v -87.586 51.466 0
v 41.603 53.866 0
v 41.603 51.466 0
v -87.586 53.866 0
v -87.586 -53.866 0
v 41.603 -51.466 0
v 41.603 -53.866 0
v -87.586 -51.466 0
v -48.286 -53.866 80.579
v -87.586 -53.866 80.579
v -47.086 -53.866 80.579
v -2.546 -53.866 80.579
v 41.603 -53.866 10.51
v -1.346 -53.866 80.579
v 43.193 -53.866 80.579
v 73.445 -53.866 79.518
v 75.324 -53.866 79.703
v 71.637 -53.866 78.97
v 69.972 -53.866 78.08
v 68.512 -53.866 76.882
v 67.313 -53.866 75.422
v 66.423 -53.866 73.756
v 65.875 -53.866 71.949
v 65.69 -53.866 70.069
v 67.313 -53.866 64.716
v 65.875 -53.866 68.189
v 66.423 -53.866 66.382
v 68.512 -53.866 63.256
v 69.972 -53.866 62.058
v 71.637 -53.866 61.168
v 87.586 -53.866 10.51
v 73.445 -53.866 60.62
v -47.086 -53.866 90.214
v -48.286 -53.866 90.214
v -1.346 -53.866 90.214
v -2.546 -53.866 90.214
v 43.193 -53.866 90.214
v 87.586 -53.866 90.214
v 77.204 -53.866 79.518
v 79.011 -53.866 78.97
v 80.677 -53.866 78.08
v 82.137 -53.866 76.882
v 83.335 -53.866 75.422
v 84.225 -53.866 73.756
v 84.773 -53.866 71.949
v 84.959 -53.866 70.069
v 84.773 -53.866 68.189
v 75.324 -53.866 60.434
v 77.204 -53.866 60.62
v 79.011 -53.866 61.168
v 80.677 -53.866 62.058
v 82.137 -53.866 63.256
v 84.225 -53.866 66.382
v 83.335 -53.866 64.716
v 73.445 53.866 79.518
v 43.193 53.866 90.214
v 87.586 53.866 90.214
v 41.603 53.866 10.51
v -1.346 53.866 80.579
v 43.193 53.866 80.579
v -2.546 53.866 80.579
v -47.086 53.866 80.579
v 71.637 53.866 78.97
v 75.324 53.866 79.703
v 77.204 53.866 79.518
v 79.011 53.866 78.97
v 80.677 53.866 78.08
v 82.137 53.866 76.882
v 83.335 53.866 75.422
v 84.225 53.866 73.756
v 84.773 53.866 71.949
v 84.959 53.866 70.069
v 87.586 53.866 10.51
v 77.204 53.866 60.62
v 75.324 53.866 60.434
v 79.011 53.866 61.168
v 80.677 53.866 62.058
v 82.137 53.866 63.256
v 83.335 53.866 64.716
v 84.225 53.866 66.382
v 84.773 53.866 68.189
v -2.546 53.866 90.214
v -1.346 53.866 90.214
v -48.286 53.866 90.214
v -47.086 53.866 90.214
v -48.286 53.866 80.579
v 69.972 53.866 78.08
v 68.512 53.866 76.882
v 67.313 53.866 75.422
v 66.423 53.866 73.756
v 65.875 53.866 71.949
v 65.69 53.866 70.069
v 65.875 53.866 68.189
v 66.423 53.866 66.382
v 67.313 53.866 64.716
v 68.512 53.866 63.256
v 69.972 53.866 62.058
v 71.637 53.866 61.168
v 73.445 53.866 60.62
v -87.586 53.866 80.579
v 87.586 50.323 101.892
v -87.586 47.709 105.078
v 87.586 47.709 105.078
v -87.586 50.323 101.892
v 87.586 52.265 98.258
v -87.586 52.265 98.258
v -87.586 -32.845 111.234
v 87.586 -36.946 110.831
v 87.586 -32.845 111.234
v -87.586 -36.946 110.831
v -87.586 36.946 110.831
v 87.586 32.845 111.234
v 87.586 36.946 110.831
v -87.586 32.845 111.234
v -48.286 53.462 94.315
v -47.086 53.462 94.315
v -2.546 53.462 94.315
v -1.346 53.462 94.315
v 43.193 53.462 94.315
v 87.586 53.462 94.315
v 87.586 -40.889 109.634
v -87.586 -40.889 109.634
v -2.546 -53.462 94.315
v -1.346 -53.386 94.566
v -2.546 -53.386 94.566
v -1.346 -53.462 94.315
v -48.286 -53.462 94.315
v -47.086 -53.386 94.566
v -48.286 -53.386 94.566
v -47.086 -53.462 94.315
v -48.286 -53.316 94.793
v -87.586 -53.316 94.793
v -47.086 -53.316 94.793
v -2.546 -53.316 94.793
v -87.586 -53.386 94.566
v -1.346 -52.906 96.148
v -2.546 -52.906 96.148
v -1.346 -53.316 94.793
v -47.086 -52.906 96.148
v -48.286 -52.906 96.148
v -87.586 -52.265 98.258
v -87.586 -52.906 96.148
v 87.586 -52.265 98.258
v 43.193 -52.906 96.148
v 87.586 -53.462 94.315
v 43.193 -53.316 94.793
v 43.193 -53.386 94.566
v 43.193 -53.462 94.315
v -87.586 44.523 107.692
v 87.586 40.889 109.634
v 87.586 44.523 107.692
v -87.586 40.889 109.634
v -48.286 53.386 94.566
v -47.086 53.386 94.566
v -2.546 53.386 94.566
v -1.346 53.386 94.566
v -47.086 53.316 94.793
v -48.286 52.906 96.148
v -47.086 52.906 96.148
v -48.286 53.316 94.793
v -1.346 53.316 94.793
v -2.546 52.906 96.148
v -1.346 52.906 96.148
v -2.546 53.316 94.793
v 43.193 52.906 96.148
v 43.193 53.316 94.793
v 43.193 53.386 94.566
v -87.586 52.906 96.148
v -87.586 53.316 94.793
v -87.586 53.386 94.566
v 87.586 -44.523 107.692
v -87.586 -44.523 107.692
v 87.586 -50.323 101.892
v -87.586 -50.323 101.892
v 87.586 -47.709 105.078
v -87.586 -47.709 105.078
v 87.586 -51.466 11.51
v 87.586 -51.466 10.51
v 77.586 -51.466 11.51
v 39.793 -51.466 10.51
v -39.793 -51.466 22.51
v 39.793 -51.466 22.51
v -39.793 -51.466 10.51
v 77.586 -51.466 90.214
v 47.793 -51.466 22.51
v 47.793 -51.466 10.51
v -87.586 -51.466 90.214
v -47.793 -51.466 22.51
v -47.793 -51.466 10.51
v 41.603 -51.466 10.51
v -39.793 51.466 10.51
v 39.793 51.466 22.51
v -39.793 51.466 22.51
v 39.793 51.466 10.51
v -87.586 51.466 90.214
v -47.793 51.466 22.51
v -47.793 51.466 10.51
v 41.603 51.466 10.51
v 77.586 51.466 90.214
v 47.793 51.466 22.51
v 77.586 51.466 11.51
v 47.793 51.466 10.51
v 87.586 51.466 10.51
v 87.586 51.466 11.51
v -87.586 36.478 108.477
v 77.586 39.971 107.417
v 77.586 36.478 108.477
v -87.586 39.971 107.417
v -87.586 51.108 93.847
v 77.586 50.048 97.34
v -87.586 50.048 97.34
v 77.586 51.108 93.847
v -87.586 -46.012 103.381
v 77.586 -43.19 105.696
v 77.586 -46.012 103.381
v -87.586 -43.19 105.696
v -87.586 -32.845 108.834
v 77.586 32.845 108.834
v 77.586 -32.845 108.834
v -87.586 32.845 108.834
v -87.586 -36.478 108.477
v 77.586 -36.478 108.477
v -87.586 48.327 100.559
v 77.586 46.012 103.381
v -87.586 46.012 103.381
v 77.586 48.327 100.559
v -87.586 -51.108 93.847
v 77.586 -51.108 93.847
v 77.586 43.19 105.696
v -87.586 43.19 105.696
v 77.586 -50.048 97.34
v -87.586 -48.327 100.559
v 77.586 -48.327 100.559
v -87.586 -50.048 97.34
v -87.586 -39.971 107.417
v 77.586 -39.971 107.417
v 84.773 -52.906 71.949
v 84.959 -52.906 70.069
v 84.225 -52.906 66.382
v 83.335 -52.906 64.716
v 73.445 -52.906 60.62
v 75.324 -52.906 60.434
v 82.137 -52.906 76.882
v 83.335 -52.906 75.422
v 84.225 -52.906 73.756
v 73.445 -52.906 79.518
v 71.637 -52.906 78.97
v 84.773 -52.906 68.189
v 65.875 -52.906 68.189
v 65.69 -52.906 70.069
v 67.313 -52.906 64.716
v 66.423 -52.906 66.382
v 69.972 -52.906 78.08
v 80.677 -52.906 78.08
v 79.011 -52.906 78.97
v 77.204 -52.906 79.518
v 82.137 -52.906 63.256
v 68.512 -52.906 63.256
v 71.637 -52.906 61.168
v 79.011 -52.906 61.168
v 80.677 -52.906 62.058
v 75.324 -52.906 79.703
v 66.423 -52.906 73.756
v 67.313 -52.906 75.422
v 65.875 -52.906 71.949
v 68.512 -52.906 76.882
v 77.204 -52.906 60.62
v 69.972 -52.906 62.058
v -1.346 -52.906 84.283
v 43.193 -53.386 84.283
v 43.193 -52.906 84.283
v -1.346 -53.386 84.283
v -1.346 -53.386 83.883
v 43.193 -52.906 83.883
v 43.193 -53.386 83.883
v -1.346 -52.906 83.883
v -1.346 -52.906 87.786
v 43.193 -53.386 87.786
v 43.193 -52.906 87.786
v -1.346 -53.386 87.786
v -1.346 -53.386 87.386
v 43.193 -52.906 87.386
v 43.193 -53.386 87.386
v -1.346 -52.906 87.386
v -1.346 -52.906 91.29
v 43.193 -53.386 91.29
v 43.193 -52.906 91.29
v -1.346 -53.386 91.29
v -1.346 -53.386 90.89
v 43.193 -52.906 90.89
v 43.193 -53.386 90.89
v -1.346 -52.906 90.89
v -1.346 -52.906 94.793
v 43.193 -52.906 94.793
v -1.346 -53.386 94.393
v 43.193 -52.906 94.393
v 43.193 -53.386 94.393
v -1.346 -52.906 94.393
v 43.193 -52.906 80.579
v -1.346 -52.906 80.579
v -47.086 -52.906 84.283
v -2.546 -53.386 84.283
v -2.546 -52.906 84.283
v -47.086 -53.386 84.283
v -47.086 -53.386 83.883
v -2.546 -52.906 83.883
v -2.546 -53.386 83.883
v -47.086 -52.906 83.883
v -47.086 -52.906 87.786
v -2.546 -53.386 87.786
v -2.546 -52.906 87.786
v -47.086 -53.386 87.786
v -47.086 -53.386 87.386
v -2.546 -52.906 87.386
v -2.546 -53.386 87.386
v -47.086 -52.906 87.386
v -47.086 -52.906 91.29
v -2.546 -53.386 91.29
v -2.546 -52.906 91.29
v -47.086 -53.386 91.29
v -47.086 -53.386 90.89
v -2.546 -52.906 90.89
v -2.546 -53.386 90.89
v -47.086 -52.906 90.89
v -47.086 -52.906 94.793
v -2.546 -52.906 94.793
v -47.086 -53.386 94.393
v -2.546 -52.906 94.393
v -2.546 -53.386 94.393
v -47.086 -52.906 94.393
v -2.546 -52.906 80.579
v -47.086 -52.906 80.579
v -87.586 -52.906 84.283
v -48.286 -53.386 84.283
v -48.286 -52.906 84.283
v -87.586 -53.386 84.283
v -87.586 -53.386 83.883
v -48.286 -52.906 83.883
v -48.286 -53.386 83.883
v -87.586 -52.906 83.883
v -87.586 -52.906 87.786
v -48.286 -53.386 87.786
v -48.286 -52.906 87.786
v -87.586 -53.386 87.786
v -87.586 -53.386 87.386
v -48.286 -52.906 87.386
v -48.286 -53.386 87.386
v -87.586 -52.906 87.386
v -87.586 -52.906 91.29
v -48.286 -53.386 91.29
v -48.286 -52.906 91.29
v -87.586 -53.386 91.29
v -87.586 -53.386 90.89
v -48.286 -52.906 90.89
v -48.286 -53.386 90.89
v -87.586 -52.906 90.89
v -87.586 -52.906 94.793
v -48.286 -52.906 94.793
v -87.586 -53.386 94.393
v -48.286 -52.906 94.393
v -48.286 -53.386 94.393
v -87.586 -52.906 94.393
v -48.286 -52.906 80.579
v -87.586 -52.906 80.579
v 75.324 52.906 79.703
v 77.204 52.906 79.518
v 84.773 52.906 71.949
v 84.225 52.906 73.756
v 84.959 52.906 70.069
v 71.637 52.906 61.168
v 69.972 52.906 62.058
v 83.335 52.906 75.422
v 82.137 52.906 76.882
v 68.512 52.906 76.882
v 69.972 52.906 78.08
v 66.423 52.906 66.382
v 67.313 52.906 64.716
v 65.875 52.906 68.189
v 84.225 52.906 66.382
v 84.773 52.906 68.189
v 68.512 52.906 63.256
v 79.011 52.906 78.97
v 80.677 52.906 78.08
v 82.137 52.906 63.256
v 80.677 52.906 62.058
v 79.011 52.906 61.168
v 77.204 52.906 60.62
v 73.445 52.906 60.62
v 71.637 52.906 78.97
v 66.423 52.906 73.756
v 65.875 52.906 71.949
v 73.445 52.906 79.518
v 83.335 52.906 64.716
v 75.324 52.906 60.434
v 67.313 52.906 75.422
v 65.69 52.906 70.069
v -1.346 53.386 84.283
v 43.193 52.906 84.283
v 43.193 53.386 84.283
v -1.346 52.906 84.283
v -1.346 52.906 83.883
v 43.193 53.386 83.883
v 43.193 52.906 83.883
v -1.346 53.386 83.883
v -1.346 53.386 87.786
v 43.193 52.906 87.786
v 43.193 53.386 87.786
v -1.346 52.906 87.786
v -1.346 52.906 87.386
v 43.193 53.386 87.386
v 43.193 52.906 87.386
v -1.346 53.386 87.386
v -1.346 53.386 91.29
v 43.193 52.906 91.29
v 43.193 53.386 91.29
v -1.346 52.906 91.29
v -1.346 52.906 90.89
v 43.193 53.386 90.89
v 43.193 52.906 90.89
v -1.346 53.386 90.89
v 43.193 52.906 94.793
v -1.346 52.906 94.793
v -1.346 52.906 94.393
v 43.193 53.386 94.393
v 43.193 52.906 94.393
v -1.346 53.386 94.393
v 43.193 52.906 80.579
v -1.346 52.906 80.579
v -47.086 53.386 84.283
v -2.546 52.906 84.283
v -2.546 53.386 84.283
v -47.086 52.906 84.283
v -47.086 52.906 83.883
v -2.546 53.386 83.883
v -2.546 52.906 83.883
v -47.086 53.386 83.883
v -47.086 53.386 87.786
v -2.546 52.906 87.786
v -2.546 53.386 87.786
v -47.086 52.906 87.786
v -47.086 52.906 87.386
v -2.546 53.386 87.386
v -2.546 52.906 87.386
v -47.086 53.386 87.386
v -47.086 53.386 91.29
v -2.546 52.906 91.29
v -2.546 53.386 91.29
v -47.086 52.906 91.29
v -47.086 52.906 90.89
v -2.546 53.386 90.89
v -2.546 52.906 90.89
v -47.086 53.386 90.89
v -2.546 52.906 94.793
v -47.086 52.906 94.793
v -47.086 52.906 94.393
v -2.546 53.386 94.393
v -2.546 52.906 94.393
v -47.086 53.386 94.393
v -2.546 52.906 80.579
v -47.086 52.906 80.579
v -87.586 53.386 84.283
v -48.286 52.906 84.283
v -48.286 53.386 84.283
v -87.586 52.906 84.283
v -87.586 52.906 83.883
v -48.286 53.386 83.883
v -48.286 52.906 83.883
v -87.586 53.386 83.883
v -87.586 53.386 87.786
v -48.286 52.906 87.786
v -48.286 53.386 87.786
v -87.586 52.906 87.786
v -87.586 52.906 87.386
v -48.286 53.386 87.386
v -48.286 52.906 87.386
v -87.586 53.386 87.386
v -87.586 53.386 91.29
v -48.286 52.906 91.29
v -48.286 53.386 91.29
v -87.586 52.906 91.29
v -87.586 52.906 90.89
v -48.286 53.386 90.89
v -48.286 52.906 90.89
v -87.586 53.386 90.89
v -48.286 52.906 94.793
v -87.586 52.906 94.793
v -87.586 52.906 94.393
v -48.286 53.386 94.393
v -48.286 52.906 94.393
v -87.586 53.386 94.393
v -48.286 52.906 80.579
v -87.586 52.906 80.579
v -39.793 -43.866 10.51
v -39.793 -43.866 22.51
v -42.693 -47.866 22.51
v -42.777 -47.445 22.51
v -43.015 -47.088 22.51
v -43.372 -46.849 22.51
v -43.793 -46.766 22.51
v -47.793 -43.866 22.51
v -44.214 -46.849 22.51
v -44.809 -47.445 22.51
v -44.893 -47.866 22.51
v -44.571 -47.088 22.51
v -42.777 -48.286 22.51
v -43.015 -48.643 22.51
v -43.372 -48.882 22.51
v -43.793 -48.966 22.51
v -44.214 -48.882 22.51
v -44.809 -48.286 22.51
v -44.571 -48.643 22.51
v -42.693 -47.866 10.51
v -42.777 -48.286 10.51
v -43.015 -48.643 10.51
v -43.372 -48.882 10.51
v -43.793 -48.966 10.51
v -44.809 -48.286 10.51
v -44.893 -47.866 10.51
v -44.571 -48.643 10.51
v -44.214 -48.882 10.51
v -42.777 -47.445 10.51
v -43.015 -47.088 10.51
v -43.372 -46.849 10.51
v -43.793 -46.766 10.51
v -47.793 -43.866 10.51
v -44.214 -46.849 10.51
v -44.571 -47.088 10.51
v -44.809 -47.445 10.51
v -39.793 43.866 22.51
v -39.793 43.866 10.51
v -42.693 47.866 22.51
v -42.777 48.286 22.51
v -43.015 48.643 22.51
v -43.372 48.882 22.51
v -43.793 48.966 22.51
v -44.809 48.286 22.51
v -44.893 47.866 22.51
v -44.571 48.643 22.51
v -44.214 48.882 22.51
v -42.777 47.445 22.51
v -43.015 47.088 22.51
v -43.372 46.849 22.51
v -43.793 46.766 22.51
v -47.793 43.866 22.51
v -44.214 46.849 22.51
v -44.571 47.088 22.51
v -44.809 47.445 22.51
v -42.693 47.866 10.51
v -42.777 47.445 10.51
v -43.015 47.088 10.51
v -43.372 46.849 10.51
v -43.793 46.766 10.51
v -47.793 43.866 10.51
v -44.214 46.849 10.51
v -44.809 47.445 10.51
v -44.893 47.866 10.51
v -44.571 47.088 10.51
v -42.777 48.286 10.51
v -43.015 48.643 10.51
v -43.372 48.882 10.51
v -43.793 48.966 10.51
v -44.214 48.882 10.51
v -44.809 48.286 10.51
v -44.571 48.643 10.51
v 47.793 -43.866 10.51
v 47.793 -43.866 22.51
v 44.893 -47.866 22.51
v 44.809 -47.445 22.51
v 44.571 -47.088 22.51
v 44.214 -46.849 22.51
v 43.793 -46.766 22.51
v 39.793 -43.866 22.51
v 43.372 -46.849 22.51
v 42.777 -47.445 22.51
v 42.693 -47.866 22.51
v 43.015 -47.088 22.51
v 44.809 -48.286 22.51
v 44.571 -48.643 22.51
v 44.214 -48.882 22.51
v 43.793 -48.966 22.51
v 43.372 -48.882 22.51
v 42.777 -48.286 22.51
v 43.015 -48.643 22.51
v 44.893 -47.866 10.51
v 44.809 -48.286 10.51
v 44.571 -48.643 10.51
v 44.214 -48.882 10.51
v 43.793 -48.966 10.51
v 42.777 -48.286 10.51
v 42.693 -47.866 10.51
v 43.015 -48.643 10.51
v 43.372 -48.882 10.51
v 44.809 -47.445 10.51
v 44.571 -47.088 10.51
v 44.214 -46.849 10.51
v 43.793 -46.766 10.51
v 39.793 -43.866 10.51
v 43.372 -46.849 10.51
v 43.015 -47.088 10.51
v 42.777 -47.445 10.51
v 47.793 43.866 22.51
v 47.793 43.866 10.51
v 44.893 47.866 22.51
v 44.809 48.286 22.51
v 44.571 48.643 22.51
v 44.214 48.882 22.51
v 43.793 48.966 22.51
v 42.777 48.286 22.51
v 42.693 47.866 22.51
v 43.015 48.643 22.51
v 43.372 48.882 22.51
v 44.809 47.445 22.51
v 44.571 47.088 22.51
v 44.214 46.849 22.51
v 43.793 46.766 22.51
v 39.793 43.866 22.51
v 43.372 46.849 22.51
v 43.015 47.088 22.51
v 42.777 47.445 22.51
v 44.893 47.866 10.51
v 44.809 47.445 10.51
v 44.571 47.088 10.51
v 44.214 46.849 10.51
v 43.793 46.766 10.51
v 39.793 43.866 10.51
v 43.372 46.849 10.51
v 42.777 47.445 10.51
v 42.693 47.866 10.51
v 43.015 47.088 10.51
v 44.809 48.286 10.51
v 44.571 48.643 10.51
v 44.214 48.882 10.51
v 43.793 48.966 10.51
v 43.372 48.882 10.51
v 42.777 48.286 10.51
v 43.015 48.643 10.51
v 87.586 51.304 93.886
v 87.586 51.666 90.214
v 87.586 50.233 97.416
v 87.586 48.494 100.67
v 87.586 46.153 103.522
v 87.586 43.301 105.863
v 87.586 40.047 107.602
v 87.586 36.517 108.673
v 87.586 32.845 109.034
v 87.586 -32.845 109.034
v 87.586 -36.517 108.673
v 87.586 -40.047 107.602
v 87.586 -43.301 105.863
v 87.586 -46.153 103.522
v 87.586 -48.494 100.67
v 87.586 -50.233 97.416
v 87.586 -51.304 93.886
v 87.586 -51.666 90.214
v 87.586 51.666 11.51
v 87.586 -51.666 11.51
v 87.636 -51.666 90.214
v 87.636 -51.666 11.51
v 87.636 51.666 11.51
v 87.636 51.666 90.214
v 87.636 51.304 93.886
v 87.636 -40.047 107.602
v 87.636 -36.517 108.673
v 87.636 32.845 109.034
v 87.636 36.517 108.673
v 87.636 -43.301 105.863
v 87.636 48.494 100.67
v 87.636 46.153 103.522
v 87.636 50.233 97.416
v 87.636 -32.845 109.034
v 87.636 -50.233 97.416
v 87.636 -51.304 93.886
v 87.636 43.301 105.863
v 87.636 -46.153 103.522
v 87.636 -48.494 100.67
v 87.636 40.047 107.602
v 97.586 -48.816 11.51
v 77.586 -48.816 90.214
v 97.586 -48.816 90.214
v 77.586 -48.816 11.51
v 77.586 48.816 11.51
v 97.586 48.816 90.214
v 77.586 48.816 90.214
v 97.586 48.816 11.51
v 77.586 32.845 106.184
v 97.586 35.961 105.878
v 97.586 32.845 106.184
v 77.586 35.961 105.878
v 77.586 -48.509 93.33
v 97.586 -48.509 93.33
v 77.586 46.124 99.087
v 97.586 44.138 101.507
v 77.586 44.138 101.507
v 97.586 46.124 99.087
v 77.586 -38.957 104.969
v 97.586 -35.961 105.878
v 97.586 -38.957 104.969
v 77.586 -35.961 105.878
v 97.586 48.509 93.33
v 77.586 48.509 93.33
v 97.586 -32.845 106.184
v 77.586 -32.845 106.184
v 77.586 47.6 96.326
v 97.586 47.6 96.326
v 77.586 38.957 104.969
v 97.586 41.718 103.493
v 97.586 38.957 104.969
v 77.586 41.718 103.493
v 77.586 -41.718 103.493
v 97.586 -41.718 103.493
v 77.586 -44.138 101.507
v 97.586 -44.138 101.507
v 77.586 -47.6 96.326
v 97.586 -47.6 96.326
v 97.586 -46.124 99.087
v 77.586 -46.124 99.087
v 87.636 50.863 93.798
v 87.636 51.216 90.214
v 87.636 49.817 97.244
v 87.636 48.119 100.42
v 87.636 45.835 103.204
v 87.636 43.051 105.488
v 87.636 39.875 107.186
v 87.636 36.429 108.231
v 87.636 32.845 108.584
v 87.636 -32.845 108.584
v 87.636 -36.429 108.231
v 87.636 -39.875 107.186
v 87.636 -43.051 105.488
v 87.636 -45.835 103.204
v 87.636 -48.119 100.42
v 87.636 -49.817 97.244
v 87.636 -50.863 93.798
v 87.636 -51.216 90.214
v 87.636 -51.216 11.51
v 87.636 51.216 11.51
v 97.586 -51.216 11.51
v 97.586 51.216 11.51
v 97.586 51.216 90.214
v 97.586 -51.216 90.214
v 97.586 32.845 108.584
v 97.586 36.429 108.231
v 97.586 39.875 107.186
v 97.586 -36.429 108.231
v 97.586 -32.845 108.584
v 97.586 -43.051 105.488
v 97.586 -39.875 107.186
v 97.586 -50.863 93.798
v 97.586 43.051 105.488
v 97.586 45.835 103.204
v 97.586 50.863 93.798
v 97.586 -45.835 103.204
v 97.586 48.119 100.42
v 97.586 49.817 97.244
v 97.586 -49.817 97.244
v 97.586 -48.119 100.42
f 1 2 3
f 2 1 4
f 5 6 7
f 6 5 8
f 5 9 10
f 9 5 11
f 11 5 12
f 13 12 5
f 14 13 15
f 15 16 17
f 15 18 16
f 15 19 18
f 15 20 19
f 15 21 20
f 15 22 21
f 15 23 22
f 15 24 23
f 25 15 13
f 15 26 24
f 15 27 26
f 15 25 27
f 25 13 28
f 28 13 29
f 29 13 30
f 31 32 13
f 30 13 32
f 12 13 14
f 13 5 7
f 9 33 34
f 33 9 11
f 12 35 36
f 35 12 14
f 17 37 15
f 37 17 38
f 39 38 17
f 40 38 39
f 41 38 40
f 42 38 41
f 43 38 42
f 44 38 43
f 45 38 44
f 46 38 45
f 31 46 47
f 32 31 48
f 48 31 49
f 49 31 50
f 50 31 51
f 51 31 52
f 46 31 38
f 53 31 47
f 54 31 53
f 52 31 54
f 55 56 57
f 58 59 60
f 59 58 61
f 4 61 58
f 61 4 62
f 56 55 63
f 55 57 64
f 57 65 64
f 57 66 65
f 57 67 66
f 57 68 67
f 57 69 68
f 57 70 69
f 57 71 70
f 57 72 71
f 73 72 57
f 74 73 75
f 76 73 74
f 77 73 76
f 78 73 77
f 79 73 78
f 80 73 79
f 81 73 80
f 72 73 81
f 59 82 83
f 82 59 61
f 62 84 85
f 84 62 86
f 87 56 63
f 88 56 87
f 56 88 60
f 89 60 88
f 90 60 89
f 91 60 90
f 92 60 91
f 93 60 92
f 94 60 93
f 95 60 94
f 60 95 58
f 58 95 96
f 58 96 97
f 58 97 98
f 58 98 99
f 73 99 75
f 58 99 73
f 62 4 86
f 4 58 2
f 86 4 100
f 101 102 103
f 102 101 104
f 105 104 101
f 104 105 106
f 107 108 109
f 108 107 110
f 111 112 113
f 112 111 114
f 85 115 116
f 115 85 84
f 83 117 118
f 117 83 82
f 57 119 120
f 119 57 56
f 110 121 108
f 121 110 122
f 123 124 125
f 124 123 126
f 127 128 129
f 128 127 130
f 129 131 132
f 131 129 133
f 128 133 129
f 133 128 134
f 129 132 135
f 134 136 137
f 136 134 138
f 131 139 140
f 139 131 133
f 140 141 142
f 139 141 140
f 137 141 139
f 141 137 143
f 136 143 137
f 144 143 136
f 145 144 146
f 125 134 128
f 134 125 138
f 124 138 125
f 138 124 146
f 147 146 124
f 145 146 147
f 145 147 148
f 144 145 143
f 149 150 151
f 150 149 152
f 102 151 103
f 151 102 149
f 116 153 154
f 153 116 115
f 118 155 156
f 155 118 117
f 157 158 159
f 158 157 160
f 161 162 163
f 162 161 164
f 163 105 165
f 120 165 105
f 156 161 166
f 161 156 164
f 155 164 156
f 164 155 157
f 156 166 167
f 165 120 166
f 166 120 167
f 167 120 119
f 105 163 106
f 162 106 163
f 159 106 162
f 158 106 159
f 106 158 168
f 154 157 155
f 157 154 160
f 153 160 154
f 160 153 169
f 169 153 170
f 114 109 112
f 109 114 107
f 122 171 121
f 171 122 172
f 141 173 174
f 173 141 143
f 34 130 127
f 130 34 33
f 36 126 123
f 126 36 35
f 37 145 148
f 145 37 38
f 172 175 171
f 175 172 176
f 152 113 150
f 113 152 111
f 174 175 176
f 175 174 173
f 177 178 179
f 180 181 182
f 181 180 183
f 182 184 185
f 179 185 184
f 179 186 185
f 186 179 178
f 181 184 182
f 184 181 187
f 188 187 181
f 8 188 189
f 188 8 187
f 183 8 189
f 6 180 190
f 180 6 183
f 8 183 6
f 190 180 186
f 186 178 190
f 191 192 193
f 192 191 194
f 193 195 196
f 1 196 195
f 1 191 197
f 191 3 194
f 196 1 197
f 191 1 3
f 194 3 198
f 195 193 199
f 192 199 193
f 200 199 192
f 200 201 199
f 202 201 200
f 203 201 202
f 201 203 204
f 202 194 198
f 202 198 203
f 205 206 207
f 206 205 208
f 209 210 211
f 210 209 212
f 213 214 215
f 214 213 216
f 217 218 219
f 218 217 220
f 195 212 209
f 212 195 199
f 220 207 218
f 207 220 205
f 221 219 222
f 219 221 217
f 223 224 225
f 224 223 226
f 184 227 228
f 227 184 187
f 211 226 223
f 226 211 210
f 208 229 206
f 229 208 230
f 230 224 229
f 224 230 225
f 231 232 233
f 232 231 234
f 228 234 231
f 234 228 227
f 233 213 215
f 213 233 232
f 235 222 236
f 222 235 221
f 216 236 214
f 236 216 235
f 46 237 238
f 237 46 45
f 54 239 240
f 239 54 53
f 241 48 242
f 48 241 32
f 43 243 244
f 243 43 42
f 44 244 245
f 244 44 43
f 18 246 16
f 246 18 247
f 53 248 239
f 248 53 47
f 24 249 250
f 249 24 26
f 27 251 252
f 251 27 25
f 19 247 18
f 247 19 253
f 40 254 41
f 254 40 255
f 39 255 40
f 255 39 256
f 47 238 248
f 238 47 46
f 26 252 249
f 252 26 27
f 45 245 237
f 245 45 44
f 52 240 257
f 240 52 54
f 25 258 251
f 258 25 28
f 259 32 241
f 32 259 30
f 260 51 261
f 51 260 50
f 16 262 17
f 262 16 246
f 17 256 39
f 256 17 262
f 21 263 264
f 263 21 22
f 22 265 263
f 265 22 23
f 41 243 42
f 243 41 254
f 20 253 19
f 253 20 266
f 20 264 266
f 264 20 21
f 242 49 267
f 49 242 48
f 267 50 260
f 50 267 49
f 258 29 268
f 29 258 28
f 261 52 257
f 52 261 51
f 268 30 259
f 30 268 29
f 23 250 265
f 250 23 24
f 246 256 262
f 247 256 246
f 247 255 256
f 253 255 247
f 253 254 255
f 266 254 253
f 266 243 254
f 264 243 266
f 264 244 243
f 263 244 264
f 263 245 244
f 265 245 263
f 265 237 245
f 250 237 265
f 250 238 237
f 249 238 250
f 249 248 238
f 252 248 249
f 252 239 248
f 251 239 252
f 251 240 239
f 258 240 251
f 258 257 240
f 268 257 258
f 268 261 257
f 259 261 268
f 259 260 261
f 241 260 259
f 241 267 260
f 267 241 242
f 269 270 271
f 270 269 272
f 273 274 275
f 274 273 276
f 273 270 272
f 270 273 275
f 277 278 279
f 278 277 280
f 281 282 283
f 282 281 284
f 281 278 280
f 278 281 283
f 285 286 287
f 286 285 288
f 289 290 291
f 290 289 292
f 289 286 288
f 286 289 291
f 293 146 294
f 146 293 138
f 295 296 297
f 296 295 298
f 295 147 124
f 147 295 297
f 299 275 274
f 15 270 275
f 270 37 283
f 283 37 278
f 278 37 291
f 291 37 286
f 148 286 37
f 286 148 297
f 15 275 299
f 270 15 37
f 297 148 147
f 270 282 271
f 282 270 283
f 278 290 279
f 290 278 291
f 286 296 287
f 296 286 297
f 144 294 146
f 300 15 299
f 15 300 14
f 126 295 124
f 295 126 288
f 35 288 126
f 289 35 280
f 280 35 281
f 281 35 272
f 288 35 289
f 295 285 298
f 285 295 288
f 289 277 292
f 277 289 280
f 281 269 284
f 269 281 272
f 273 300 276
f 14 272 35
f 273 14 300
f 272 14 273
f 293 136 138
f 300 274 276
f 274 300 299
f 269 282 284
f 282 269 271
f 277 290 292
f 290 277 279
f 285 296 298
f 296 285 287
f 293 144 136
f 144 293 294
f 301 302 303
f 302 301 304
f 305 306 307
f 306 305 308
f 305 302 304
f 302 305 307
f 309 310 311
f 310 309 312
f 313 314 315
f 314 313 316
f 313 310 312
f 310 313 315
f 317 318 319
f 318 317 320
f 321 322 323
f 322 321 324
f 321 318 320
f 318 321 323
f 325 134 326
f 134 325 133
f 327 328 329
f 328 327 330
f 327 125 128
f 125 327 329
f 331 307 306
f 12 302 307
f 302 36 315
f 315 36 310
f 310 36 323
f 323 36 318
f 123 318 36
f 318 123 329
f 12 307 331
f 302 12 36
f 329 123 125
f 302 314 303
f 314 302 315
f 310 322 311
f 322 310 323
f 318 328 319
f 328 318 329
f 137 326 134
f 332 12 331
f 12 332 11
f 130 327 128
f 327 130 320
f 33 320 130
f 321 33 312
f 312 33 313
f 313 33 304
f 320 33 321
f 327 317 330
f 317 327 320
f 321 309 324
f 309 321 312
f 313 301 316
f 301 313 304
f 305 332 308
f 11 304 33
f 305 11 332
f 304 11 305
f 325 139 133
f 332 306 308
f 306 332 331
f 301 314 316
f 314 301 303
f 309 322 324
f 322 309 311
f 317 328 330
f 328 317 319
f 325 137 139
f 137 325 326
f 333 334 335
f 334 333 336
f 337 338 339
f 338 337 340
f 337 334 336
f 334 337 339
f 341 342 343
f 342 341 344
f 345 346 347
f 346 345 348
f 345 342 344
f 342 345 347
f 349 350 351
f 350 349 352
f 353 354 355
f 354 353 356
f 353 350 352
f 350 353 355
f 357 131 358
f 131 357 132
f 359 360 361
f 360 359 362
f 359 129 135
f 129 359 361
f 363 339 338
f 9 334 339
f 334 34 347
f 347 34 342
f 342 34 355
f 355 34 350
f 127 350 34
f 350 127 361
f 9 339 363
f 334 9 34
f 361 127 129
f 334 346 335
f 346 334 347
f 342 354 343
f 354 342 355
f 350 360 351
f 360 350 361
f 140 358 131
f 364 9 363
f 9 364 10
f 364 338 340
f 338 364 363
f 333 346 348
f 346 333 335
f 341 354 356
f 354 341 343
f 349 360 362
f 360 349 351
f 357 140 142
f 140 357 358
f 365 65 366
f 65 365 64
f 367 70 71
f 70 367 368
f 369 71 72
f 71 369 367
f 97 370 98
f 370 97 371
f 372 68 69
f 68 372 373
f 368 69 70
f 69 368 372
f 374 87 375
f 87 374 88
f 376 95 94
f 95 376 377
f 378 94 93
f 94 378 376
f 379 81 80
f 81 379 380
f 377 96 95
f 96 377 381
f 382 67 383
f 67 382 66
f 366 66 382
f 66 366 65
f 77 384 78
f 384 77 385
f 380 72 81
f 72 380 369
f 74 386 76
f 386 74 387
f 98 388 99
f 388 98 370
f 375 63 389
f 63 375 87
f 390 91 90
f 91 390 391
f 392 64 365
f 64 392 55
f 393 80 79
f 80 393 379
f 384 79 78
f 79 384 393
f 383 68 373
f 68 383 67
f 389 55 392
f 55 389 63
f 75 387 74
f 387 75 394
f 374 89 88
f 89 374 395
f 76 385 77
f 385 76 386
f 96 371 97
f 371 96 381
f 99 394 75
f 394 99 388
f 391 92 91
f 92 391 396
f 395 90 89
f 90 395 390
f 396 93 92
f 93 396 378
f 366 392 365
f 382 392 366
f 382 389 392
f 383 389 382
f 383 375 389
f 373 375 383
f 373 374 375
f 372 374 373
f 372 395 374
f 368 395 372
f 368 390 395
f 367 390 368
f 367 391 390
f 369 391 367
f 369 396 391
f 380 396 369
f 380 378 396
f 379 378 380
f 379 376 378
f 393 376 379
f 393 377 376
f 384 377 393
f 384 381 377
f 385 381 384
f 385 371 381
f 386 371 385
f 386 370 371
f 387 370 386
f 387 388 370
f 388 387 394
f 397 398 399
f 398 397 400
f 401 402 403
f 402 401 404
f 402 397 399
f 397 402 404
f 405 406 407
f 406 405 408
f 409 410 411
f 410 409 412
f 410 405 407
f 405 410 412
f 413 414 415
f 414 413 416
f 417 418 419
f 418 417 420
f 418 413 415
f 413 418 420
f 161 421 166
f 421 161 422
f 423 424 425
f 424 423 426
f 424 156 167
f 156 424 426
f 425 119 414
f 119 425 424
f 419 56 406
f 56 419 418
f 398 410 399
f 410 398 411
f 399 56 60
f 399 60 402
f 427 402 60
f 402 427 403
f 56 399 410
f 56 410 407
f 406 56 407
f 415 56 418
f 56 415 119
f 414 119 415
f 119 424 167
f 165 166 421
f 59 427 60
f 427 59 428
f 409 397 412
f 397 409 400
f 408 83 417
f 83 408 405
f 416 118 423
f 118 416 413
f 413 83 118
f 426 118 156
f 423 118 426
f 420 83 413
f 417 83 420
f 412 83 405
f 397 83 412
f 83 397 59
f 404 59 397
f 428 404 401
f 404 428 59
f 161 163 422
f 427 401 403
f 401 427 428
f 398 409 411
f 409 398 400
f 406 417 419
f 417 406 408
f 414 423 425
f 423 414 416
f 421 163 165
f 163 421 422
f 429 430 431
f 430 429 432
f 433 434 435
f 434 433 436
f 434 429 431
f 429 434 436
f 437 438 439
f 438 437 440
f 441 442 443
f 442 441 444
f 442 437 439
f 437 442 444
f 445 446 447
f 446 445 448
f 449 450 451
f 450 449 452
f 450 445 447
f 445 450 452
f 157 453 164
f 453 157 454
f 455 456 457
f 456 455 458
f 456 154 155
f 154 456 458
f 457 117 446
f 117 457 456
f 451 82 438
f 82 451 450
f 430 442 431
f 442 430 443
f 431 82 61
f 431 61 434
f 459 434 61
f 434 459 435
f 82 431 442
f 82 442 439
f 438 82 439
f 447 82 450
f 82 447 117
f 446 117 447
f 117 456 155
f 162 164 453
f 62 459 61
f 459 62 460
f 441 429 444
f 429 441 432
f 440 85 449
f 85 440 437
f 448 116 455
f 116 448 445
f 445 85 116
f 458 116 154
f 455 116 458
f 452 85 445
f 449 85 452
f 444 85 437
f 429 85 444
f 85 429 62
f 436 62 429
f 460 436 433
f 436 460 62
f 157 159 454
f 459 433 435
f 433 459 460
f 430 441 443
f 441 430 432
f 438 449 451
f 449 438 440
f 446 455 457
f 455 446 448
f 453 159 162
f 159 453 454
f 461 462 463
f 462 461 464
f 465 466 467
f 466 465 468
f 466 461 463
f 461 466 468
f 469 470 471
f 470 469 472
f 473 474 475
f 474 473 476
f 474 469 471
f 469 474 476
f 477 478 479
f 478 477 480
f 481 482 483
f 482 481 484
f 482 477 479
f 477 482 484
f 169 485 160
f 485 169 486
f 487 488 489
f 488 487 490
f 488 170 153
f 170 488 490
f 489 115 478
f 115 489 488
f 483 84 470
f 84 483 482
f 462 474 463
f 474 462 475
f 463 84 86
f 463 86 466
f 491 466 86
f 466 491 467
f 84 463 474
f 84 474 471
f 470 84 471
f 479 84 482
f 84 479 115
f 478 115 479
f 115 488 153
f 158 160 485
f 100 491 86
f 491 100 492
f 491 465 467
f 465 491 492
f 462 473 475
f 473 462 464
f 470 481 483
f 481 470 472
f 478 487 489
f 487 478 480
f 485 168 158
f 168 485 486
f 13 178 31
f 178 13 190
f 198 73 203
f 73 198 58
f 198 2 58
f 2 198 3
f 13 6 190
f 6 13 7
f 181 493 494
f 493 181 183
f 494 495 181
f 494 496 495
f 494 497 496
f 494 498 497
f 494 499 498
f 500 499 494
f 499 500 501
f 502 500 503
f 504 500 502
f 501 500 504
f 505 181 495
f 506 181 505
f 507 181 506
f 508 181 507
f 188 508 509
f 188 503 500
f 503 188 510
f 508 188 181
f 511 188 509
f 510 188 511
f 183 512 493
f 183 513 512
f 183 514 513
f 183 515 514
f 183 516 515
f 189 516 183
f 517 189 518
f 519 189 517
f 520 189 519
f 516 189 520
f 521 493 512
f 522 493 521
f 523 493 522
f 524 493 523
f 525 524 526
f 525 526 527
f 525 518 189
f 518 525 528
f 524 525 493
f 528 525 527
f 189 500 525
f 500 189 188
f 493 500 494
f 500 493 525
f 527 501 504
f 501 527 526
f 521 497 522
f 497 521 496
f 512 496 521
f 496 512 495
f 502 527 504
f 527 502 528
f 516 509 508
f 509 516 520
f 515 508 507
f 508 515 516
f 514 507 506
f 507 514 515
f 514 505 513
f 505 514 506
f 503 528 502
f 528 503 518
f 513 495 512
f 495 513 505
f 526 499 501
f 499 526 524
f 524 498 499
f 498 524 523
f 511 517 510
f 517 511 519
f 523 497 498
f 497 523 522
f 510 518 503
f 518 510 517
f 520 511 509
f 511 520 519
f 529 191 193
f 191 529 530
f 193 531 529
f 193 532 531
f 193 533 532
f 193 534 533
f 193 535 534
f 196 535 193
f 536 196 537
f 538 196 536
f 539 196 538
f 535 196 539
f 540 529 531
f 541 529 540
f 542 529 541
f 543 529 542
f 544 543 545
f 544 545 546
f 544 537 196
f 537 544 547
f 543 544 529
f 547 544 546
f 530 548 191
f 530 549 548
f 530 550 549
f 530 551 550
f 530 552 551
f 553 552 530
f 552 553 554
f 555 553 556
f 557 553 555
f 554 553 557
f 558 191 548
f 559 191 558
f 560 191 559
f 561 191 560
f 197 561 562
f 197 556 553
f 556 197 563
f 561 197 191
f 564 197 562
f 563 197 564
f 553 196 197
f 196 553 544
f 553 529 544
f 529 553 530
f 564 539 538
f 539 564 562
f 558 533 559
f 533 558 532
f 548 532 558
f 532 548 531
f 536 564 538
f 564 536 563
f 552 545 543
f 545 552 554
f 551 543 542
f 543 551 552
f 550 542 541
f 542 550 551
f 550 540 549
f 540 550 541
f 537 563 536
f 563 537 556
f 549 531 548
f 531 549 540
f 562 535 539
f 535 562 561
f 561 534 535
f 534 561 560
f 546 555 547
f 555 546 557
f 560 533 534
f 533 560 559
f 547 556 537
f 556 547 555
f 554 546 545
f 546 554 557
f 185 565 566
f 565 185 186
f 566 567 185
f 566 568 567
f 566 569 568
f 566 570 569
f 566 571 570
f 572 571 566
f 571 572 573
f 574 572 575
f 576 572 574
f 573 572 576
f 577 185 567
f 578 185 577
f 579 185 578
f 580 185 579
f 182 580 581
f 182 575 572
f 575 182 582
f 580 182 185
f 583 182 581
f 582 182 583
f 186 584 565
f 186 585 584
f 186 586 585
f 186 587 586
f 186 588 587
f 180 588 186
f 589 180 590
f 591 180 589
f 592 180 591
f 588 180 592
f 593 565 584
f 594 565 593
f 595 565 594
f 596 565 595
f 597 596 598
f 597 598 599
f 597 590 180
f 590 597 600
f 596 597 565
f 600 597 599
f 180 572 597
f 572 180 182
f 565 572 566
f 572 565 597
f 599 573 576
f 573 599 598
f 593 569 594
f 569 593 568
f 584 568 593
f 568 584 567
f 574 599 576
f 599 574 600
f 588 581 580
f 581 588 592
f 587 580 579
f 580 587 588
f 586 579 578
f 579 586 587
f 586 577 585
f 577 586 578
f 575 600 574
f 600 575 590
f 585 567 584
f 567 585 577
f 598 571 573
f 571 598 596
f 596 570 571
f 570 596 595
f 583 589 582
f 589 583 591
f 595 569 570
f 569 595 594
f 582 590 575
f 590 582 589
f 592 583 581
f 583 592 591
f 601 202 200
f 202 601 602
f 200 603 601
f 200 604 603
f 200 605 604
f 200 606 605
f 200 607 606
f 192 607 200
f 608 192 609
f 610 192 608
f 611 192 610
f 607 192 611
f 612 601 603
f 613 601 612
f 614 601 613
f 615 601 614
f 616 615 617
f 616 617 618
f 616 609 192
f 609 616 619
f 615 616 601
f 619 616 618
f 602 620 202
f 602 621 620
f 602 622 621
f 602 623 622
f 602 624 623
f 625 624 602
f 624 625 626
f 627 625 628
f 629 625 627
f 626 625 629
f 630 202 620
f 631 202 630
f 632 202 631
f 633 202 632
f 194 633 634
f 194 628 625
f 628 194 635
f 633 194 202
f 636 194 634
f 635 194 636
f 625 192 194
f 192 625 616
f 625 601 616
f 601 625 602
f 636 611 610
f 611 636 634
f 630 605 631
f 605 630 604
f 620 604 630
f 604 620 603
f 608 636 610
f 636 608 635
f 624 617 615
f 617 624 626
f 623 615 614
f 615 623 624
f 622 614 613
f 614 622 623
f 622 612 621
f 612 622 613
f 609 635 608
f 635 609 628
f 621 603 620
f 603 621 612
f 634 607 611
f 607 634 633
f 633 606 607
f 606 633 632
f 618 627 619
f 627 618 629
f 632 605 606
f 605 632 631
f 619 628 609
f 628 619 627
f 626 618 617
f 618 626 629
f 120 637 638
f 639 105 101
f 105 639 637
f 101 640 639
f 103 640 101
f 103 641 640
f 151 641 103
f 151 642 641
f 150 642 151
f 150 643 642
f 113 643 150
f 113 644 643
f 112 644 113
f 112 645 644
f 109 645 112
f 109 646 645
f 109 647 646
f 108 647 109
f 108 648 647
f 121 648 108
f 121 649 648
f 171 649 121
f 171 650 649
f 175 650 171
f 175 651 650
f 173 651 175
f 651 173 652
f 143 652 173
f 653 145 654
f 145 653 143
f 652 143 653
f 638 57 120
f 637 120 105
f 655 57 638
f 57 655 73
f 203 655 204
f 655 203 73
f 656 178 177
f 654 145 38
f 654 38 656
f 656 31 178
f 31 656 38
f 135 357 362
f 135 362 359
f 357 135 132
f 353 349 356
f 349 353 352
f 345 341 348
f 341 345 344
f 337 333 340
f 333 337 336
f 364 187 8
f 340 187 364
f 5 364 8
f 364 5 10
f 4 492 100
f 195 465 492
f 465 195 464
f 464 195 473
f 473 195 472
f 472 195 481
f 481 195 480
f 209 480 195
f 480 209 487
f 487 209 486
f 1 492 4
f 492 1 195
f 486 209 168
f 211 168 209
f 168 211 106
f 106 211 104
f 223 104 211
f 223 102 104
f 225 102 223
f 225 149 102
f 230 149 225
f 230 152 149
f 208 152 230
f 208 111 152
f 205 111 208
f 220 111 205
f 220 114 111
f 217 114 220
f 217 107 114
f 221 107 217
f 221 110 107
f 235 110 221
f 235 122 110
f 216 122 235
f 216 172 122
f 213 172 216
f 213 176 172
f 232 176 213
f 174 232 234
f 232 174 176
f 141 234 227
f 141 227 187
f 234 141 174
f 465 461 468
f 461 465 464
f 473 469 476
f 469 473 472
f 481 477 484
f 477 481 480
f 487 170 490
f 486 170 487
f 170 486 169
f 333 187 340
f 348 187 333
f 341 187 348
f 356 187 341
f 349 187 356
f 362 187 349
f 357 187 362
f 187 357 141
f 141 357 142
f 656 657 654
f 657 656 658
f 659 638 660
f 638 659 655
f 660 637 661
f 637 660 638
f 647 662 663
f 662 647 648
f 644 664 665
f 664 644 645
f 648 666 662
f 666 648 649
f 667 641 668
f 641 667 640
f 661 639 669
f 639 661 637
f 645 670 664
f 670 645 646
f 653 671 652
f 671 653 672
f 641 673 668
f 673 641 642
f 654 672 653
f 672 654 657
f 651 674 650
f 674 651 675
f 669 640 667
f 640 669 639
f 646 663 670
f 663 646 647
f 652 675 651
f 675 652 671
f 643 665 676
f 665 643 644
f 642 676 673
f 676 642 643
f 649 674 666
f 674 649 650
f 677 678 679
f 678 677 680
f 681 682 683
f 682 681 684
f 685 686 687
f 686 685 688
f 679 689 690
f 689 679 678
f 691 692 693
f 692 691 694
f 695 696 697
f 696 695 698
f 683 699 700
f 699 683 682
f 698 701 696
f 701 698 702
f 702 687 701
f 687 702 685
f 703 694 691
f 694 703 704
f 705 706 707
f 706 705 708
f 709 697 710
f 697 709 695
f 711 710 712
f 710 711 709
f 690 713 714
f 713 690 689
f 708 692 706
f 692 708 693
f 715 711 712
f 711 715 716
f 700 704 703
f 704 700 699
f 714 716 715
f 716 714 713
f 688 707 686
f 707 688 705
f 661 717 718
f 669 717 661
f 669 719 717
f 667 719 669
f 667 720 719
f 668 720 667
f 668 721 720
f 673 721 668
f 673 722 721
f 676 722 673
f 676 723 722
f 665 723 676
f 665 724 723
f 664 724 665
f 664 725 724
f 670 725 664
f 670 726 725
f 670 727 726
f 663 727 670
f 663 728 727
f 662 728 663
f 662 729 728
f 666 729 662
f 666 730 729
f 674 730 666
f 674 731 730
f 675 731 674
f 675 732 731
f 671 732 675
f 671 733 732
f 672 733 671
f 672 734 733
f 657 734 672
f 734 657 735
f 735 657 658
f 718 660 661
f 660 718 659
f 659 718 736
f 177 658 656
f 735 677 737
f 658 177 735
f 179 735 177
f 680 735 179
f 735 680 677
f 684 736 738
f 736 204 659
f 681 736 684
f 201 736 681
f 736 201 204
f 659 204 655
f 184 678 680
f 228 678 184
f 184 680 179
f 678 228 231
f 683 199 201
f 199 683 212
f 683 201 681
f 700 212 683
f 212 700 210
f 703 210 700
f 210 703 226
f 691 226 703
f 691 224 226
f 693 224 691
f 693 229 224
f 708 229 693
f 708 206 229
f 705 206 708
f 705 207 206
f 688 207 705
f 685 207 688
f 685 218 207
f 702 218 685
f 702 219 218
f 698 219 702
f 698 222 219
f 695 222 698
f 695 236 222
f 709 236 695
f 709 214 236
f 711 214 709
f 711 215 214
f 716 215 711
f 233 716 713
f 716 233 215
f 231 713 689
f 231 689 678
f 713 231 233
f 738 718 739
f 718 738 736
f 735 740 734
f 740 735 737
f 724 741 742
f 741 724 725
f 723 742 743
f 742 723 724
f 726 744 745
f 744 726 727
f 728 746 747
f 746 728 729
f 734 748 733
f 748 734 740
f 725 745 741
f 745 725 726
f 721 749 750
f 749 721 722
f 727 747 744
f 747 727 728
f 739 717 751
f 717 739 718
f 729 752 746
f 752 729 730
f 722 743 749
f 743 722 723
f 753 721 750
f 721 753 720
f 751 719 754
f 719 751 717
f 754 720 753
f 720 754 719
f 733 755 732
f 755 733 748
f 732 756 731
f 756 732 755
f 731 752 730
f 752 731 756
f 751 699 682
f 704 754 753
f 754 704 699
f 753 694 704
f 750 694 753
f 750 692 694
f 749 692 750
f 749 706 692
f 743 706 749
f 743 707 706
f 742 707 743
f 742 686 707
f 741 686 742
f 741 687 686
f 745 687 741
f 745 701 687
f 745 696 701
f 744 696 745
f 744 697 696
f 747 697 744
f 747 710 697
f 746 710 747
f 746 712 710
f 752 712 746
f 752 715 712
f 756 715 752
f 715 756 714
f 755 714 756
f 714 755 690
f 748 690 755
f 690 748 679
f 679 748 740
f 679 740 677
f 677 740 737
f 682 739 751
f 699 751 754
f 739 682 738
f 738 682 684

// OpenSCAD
// file: ../../library/e7_all.scad
// ==========================================================================
//  e7_all.scad - include this one file. Preview, print plates and the report.
// ==========================================================================
include <e7_params.scad>
include <e7_body.scad>

// whole painted loco
module e7_preview() {
  // carbody in its paint bands
  for (i = [0:len(PAINT_BANDS) - 1]) {
    z0 = i == 0 ? -1 : p(PAINT_BANDS[i - 1][0]);
    z1 = i == len(PAINT_BANDS) - 1 ? 1000 : p(PAINT_BANDS[i][0]);
    color(PAINT_BANDS[i][1]) render(convexity = 8) e7_shell_solid([z0, z1]);
  }
  color(C_GLASS) e7_glass();
  color(C_LENS) let (d = nose_d_at_z(HEADLIGHT[0]))
    translate([XF - p(d) + p(HEADLIGHT[2]) + p(1.5), 0, p(HEADLIGHT[0])]) rotate([0, 90, 0]) cylinder(d = p(HEADLIGHT[1]) - 0.8, h = 0.5, $fn = 32);
  color(C_FRAME) { for (j = [1:NFRAME]) e7_frame_piece(j); e7_pilot(); e7_pilot_rear(); }
  for (tx = [TRK_X, -TRK_X]) translate([tx, 0, 0]) { color(C_TRUCK) e7_truck_frame(); color(C_WHEEL) e7_wheels(); }
}
// thin glass panes sitting in the window pockets (preview only)
module e7_glass() {
  intersection() { e7_loft(DET * 0.6); union() { e7_windshield_cut(); e7_side_cuts_windows_only(); } }
}
module e7_side_cuts_windows_only() {
  for (s = [-1, 1], w = CAB_WIN)
    translate([XF - p(w[1]), s * HW - (s > 0 ? DET : 3 - DET), p(w[2])]) cube([p(w[1] - w[0]), 3, p(w[3] - w[2])]);
}

// one print, laid out for the printer
module e7_plate(part) {
  sec = [for (k = [1:NSEC]) str("body_", k)];
  frm = [for (j = [1:NFRAME]) str("frame_", j)];
  if (is_num(search([part], sec)[0])) {
    k = search([part], sec)[0] + 1;
    // stand the section on its open bottom (skirt edge on the bed)
    translate([-sec_x0(k) - SEC_L / 2, 0, -Z_SKIRT]) e7_body_section(k);
  } else if (is_num(search([part], frm)[0])) {
    j = search([part], frm)[0] + 1;
    xs = concat([FRAME_X0], FRAME_SPLITS, [FRAME_X1]);
    translate([-(xs[j - 1] + xs[j]) / 2, 0, -Z_FRAME_BOT]) e7_frame_piece(j);
  } else if (part == "pilot") {
    translate([-XF, 0, 0]) rotate([0, 0, 0]) translate([0, 0, -p(5)]) e7_pilot();
  } else if (part == "pilot_rear") {
    translate([-XR, 0, 0]) translate([0, 0, -(CPL_Z - CPL_H / 2 - WALL)]) e7_pilot_rear();
  } else if (part == "truck") {
    // upside down, bolster on the bed
    translate([0, 0, Z_FRAME_BOT - 0.3]) rotate([180, 0, 0]) e7_truck_frame();
  } else {
    assert(false, str("unknown part '", part, "'"));
  }
}

module e7_report() {
  echo(str("MILW E7A ", ROAD_NO, " class ", CLASS, " - ", SC, " scale 1:", RATIO, ", paint ", PAINT));
  echo(str("  carbody ", round(BL), " mm long, ", round(2 * HW), " mm wide, roof ", round(Z_ROOF), " mm, cab ", round(Z_CAB), " mm above rail"));
  echo(str("  ", NSEC, " body sections of ", round(SEC_L), " mm; ", NFRAME, " frame pieces; trucks at +/- ", round(TRK_X), " mm"));
  echo(str("  body screws ", SCREW_BODY_NAME, " x ", 2 * len(BOSS_X), "; truck pivots ", PIVOT[1], "; wheels ", round(WHEEL_D * 10) / 10, " mm (bought)"));
}
// main file
// Milwaukee Road E7A, G scale 1-29 - print 3 of 12: body_3 - carbody section 3 (print upright, open side down)
// Render (F6), export STL, print. Settings: ../../library/e7_params.scad
// Whole loco preview and notes: ../../MILW_E7_Main.scad
SCALE_SEL = "G";
include <../../library/e7_all.scad>
e7_plate("body_3");
